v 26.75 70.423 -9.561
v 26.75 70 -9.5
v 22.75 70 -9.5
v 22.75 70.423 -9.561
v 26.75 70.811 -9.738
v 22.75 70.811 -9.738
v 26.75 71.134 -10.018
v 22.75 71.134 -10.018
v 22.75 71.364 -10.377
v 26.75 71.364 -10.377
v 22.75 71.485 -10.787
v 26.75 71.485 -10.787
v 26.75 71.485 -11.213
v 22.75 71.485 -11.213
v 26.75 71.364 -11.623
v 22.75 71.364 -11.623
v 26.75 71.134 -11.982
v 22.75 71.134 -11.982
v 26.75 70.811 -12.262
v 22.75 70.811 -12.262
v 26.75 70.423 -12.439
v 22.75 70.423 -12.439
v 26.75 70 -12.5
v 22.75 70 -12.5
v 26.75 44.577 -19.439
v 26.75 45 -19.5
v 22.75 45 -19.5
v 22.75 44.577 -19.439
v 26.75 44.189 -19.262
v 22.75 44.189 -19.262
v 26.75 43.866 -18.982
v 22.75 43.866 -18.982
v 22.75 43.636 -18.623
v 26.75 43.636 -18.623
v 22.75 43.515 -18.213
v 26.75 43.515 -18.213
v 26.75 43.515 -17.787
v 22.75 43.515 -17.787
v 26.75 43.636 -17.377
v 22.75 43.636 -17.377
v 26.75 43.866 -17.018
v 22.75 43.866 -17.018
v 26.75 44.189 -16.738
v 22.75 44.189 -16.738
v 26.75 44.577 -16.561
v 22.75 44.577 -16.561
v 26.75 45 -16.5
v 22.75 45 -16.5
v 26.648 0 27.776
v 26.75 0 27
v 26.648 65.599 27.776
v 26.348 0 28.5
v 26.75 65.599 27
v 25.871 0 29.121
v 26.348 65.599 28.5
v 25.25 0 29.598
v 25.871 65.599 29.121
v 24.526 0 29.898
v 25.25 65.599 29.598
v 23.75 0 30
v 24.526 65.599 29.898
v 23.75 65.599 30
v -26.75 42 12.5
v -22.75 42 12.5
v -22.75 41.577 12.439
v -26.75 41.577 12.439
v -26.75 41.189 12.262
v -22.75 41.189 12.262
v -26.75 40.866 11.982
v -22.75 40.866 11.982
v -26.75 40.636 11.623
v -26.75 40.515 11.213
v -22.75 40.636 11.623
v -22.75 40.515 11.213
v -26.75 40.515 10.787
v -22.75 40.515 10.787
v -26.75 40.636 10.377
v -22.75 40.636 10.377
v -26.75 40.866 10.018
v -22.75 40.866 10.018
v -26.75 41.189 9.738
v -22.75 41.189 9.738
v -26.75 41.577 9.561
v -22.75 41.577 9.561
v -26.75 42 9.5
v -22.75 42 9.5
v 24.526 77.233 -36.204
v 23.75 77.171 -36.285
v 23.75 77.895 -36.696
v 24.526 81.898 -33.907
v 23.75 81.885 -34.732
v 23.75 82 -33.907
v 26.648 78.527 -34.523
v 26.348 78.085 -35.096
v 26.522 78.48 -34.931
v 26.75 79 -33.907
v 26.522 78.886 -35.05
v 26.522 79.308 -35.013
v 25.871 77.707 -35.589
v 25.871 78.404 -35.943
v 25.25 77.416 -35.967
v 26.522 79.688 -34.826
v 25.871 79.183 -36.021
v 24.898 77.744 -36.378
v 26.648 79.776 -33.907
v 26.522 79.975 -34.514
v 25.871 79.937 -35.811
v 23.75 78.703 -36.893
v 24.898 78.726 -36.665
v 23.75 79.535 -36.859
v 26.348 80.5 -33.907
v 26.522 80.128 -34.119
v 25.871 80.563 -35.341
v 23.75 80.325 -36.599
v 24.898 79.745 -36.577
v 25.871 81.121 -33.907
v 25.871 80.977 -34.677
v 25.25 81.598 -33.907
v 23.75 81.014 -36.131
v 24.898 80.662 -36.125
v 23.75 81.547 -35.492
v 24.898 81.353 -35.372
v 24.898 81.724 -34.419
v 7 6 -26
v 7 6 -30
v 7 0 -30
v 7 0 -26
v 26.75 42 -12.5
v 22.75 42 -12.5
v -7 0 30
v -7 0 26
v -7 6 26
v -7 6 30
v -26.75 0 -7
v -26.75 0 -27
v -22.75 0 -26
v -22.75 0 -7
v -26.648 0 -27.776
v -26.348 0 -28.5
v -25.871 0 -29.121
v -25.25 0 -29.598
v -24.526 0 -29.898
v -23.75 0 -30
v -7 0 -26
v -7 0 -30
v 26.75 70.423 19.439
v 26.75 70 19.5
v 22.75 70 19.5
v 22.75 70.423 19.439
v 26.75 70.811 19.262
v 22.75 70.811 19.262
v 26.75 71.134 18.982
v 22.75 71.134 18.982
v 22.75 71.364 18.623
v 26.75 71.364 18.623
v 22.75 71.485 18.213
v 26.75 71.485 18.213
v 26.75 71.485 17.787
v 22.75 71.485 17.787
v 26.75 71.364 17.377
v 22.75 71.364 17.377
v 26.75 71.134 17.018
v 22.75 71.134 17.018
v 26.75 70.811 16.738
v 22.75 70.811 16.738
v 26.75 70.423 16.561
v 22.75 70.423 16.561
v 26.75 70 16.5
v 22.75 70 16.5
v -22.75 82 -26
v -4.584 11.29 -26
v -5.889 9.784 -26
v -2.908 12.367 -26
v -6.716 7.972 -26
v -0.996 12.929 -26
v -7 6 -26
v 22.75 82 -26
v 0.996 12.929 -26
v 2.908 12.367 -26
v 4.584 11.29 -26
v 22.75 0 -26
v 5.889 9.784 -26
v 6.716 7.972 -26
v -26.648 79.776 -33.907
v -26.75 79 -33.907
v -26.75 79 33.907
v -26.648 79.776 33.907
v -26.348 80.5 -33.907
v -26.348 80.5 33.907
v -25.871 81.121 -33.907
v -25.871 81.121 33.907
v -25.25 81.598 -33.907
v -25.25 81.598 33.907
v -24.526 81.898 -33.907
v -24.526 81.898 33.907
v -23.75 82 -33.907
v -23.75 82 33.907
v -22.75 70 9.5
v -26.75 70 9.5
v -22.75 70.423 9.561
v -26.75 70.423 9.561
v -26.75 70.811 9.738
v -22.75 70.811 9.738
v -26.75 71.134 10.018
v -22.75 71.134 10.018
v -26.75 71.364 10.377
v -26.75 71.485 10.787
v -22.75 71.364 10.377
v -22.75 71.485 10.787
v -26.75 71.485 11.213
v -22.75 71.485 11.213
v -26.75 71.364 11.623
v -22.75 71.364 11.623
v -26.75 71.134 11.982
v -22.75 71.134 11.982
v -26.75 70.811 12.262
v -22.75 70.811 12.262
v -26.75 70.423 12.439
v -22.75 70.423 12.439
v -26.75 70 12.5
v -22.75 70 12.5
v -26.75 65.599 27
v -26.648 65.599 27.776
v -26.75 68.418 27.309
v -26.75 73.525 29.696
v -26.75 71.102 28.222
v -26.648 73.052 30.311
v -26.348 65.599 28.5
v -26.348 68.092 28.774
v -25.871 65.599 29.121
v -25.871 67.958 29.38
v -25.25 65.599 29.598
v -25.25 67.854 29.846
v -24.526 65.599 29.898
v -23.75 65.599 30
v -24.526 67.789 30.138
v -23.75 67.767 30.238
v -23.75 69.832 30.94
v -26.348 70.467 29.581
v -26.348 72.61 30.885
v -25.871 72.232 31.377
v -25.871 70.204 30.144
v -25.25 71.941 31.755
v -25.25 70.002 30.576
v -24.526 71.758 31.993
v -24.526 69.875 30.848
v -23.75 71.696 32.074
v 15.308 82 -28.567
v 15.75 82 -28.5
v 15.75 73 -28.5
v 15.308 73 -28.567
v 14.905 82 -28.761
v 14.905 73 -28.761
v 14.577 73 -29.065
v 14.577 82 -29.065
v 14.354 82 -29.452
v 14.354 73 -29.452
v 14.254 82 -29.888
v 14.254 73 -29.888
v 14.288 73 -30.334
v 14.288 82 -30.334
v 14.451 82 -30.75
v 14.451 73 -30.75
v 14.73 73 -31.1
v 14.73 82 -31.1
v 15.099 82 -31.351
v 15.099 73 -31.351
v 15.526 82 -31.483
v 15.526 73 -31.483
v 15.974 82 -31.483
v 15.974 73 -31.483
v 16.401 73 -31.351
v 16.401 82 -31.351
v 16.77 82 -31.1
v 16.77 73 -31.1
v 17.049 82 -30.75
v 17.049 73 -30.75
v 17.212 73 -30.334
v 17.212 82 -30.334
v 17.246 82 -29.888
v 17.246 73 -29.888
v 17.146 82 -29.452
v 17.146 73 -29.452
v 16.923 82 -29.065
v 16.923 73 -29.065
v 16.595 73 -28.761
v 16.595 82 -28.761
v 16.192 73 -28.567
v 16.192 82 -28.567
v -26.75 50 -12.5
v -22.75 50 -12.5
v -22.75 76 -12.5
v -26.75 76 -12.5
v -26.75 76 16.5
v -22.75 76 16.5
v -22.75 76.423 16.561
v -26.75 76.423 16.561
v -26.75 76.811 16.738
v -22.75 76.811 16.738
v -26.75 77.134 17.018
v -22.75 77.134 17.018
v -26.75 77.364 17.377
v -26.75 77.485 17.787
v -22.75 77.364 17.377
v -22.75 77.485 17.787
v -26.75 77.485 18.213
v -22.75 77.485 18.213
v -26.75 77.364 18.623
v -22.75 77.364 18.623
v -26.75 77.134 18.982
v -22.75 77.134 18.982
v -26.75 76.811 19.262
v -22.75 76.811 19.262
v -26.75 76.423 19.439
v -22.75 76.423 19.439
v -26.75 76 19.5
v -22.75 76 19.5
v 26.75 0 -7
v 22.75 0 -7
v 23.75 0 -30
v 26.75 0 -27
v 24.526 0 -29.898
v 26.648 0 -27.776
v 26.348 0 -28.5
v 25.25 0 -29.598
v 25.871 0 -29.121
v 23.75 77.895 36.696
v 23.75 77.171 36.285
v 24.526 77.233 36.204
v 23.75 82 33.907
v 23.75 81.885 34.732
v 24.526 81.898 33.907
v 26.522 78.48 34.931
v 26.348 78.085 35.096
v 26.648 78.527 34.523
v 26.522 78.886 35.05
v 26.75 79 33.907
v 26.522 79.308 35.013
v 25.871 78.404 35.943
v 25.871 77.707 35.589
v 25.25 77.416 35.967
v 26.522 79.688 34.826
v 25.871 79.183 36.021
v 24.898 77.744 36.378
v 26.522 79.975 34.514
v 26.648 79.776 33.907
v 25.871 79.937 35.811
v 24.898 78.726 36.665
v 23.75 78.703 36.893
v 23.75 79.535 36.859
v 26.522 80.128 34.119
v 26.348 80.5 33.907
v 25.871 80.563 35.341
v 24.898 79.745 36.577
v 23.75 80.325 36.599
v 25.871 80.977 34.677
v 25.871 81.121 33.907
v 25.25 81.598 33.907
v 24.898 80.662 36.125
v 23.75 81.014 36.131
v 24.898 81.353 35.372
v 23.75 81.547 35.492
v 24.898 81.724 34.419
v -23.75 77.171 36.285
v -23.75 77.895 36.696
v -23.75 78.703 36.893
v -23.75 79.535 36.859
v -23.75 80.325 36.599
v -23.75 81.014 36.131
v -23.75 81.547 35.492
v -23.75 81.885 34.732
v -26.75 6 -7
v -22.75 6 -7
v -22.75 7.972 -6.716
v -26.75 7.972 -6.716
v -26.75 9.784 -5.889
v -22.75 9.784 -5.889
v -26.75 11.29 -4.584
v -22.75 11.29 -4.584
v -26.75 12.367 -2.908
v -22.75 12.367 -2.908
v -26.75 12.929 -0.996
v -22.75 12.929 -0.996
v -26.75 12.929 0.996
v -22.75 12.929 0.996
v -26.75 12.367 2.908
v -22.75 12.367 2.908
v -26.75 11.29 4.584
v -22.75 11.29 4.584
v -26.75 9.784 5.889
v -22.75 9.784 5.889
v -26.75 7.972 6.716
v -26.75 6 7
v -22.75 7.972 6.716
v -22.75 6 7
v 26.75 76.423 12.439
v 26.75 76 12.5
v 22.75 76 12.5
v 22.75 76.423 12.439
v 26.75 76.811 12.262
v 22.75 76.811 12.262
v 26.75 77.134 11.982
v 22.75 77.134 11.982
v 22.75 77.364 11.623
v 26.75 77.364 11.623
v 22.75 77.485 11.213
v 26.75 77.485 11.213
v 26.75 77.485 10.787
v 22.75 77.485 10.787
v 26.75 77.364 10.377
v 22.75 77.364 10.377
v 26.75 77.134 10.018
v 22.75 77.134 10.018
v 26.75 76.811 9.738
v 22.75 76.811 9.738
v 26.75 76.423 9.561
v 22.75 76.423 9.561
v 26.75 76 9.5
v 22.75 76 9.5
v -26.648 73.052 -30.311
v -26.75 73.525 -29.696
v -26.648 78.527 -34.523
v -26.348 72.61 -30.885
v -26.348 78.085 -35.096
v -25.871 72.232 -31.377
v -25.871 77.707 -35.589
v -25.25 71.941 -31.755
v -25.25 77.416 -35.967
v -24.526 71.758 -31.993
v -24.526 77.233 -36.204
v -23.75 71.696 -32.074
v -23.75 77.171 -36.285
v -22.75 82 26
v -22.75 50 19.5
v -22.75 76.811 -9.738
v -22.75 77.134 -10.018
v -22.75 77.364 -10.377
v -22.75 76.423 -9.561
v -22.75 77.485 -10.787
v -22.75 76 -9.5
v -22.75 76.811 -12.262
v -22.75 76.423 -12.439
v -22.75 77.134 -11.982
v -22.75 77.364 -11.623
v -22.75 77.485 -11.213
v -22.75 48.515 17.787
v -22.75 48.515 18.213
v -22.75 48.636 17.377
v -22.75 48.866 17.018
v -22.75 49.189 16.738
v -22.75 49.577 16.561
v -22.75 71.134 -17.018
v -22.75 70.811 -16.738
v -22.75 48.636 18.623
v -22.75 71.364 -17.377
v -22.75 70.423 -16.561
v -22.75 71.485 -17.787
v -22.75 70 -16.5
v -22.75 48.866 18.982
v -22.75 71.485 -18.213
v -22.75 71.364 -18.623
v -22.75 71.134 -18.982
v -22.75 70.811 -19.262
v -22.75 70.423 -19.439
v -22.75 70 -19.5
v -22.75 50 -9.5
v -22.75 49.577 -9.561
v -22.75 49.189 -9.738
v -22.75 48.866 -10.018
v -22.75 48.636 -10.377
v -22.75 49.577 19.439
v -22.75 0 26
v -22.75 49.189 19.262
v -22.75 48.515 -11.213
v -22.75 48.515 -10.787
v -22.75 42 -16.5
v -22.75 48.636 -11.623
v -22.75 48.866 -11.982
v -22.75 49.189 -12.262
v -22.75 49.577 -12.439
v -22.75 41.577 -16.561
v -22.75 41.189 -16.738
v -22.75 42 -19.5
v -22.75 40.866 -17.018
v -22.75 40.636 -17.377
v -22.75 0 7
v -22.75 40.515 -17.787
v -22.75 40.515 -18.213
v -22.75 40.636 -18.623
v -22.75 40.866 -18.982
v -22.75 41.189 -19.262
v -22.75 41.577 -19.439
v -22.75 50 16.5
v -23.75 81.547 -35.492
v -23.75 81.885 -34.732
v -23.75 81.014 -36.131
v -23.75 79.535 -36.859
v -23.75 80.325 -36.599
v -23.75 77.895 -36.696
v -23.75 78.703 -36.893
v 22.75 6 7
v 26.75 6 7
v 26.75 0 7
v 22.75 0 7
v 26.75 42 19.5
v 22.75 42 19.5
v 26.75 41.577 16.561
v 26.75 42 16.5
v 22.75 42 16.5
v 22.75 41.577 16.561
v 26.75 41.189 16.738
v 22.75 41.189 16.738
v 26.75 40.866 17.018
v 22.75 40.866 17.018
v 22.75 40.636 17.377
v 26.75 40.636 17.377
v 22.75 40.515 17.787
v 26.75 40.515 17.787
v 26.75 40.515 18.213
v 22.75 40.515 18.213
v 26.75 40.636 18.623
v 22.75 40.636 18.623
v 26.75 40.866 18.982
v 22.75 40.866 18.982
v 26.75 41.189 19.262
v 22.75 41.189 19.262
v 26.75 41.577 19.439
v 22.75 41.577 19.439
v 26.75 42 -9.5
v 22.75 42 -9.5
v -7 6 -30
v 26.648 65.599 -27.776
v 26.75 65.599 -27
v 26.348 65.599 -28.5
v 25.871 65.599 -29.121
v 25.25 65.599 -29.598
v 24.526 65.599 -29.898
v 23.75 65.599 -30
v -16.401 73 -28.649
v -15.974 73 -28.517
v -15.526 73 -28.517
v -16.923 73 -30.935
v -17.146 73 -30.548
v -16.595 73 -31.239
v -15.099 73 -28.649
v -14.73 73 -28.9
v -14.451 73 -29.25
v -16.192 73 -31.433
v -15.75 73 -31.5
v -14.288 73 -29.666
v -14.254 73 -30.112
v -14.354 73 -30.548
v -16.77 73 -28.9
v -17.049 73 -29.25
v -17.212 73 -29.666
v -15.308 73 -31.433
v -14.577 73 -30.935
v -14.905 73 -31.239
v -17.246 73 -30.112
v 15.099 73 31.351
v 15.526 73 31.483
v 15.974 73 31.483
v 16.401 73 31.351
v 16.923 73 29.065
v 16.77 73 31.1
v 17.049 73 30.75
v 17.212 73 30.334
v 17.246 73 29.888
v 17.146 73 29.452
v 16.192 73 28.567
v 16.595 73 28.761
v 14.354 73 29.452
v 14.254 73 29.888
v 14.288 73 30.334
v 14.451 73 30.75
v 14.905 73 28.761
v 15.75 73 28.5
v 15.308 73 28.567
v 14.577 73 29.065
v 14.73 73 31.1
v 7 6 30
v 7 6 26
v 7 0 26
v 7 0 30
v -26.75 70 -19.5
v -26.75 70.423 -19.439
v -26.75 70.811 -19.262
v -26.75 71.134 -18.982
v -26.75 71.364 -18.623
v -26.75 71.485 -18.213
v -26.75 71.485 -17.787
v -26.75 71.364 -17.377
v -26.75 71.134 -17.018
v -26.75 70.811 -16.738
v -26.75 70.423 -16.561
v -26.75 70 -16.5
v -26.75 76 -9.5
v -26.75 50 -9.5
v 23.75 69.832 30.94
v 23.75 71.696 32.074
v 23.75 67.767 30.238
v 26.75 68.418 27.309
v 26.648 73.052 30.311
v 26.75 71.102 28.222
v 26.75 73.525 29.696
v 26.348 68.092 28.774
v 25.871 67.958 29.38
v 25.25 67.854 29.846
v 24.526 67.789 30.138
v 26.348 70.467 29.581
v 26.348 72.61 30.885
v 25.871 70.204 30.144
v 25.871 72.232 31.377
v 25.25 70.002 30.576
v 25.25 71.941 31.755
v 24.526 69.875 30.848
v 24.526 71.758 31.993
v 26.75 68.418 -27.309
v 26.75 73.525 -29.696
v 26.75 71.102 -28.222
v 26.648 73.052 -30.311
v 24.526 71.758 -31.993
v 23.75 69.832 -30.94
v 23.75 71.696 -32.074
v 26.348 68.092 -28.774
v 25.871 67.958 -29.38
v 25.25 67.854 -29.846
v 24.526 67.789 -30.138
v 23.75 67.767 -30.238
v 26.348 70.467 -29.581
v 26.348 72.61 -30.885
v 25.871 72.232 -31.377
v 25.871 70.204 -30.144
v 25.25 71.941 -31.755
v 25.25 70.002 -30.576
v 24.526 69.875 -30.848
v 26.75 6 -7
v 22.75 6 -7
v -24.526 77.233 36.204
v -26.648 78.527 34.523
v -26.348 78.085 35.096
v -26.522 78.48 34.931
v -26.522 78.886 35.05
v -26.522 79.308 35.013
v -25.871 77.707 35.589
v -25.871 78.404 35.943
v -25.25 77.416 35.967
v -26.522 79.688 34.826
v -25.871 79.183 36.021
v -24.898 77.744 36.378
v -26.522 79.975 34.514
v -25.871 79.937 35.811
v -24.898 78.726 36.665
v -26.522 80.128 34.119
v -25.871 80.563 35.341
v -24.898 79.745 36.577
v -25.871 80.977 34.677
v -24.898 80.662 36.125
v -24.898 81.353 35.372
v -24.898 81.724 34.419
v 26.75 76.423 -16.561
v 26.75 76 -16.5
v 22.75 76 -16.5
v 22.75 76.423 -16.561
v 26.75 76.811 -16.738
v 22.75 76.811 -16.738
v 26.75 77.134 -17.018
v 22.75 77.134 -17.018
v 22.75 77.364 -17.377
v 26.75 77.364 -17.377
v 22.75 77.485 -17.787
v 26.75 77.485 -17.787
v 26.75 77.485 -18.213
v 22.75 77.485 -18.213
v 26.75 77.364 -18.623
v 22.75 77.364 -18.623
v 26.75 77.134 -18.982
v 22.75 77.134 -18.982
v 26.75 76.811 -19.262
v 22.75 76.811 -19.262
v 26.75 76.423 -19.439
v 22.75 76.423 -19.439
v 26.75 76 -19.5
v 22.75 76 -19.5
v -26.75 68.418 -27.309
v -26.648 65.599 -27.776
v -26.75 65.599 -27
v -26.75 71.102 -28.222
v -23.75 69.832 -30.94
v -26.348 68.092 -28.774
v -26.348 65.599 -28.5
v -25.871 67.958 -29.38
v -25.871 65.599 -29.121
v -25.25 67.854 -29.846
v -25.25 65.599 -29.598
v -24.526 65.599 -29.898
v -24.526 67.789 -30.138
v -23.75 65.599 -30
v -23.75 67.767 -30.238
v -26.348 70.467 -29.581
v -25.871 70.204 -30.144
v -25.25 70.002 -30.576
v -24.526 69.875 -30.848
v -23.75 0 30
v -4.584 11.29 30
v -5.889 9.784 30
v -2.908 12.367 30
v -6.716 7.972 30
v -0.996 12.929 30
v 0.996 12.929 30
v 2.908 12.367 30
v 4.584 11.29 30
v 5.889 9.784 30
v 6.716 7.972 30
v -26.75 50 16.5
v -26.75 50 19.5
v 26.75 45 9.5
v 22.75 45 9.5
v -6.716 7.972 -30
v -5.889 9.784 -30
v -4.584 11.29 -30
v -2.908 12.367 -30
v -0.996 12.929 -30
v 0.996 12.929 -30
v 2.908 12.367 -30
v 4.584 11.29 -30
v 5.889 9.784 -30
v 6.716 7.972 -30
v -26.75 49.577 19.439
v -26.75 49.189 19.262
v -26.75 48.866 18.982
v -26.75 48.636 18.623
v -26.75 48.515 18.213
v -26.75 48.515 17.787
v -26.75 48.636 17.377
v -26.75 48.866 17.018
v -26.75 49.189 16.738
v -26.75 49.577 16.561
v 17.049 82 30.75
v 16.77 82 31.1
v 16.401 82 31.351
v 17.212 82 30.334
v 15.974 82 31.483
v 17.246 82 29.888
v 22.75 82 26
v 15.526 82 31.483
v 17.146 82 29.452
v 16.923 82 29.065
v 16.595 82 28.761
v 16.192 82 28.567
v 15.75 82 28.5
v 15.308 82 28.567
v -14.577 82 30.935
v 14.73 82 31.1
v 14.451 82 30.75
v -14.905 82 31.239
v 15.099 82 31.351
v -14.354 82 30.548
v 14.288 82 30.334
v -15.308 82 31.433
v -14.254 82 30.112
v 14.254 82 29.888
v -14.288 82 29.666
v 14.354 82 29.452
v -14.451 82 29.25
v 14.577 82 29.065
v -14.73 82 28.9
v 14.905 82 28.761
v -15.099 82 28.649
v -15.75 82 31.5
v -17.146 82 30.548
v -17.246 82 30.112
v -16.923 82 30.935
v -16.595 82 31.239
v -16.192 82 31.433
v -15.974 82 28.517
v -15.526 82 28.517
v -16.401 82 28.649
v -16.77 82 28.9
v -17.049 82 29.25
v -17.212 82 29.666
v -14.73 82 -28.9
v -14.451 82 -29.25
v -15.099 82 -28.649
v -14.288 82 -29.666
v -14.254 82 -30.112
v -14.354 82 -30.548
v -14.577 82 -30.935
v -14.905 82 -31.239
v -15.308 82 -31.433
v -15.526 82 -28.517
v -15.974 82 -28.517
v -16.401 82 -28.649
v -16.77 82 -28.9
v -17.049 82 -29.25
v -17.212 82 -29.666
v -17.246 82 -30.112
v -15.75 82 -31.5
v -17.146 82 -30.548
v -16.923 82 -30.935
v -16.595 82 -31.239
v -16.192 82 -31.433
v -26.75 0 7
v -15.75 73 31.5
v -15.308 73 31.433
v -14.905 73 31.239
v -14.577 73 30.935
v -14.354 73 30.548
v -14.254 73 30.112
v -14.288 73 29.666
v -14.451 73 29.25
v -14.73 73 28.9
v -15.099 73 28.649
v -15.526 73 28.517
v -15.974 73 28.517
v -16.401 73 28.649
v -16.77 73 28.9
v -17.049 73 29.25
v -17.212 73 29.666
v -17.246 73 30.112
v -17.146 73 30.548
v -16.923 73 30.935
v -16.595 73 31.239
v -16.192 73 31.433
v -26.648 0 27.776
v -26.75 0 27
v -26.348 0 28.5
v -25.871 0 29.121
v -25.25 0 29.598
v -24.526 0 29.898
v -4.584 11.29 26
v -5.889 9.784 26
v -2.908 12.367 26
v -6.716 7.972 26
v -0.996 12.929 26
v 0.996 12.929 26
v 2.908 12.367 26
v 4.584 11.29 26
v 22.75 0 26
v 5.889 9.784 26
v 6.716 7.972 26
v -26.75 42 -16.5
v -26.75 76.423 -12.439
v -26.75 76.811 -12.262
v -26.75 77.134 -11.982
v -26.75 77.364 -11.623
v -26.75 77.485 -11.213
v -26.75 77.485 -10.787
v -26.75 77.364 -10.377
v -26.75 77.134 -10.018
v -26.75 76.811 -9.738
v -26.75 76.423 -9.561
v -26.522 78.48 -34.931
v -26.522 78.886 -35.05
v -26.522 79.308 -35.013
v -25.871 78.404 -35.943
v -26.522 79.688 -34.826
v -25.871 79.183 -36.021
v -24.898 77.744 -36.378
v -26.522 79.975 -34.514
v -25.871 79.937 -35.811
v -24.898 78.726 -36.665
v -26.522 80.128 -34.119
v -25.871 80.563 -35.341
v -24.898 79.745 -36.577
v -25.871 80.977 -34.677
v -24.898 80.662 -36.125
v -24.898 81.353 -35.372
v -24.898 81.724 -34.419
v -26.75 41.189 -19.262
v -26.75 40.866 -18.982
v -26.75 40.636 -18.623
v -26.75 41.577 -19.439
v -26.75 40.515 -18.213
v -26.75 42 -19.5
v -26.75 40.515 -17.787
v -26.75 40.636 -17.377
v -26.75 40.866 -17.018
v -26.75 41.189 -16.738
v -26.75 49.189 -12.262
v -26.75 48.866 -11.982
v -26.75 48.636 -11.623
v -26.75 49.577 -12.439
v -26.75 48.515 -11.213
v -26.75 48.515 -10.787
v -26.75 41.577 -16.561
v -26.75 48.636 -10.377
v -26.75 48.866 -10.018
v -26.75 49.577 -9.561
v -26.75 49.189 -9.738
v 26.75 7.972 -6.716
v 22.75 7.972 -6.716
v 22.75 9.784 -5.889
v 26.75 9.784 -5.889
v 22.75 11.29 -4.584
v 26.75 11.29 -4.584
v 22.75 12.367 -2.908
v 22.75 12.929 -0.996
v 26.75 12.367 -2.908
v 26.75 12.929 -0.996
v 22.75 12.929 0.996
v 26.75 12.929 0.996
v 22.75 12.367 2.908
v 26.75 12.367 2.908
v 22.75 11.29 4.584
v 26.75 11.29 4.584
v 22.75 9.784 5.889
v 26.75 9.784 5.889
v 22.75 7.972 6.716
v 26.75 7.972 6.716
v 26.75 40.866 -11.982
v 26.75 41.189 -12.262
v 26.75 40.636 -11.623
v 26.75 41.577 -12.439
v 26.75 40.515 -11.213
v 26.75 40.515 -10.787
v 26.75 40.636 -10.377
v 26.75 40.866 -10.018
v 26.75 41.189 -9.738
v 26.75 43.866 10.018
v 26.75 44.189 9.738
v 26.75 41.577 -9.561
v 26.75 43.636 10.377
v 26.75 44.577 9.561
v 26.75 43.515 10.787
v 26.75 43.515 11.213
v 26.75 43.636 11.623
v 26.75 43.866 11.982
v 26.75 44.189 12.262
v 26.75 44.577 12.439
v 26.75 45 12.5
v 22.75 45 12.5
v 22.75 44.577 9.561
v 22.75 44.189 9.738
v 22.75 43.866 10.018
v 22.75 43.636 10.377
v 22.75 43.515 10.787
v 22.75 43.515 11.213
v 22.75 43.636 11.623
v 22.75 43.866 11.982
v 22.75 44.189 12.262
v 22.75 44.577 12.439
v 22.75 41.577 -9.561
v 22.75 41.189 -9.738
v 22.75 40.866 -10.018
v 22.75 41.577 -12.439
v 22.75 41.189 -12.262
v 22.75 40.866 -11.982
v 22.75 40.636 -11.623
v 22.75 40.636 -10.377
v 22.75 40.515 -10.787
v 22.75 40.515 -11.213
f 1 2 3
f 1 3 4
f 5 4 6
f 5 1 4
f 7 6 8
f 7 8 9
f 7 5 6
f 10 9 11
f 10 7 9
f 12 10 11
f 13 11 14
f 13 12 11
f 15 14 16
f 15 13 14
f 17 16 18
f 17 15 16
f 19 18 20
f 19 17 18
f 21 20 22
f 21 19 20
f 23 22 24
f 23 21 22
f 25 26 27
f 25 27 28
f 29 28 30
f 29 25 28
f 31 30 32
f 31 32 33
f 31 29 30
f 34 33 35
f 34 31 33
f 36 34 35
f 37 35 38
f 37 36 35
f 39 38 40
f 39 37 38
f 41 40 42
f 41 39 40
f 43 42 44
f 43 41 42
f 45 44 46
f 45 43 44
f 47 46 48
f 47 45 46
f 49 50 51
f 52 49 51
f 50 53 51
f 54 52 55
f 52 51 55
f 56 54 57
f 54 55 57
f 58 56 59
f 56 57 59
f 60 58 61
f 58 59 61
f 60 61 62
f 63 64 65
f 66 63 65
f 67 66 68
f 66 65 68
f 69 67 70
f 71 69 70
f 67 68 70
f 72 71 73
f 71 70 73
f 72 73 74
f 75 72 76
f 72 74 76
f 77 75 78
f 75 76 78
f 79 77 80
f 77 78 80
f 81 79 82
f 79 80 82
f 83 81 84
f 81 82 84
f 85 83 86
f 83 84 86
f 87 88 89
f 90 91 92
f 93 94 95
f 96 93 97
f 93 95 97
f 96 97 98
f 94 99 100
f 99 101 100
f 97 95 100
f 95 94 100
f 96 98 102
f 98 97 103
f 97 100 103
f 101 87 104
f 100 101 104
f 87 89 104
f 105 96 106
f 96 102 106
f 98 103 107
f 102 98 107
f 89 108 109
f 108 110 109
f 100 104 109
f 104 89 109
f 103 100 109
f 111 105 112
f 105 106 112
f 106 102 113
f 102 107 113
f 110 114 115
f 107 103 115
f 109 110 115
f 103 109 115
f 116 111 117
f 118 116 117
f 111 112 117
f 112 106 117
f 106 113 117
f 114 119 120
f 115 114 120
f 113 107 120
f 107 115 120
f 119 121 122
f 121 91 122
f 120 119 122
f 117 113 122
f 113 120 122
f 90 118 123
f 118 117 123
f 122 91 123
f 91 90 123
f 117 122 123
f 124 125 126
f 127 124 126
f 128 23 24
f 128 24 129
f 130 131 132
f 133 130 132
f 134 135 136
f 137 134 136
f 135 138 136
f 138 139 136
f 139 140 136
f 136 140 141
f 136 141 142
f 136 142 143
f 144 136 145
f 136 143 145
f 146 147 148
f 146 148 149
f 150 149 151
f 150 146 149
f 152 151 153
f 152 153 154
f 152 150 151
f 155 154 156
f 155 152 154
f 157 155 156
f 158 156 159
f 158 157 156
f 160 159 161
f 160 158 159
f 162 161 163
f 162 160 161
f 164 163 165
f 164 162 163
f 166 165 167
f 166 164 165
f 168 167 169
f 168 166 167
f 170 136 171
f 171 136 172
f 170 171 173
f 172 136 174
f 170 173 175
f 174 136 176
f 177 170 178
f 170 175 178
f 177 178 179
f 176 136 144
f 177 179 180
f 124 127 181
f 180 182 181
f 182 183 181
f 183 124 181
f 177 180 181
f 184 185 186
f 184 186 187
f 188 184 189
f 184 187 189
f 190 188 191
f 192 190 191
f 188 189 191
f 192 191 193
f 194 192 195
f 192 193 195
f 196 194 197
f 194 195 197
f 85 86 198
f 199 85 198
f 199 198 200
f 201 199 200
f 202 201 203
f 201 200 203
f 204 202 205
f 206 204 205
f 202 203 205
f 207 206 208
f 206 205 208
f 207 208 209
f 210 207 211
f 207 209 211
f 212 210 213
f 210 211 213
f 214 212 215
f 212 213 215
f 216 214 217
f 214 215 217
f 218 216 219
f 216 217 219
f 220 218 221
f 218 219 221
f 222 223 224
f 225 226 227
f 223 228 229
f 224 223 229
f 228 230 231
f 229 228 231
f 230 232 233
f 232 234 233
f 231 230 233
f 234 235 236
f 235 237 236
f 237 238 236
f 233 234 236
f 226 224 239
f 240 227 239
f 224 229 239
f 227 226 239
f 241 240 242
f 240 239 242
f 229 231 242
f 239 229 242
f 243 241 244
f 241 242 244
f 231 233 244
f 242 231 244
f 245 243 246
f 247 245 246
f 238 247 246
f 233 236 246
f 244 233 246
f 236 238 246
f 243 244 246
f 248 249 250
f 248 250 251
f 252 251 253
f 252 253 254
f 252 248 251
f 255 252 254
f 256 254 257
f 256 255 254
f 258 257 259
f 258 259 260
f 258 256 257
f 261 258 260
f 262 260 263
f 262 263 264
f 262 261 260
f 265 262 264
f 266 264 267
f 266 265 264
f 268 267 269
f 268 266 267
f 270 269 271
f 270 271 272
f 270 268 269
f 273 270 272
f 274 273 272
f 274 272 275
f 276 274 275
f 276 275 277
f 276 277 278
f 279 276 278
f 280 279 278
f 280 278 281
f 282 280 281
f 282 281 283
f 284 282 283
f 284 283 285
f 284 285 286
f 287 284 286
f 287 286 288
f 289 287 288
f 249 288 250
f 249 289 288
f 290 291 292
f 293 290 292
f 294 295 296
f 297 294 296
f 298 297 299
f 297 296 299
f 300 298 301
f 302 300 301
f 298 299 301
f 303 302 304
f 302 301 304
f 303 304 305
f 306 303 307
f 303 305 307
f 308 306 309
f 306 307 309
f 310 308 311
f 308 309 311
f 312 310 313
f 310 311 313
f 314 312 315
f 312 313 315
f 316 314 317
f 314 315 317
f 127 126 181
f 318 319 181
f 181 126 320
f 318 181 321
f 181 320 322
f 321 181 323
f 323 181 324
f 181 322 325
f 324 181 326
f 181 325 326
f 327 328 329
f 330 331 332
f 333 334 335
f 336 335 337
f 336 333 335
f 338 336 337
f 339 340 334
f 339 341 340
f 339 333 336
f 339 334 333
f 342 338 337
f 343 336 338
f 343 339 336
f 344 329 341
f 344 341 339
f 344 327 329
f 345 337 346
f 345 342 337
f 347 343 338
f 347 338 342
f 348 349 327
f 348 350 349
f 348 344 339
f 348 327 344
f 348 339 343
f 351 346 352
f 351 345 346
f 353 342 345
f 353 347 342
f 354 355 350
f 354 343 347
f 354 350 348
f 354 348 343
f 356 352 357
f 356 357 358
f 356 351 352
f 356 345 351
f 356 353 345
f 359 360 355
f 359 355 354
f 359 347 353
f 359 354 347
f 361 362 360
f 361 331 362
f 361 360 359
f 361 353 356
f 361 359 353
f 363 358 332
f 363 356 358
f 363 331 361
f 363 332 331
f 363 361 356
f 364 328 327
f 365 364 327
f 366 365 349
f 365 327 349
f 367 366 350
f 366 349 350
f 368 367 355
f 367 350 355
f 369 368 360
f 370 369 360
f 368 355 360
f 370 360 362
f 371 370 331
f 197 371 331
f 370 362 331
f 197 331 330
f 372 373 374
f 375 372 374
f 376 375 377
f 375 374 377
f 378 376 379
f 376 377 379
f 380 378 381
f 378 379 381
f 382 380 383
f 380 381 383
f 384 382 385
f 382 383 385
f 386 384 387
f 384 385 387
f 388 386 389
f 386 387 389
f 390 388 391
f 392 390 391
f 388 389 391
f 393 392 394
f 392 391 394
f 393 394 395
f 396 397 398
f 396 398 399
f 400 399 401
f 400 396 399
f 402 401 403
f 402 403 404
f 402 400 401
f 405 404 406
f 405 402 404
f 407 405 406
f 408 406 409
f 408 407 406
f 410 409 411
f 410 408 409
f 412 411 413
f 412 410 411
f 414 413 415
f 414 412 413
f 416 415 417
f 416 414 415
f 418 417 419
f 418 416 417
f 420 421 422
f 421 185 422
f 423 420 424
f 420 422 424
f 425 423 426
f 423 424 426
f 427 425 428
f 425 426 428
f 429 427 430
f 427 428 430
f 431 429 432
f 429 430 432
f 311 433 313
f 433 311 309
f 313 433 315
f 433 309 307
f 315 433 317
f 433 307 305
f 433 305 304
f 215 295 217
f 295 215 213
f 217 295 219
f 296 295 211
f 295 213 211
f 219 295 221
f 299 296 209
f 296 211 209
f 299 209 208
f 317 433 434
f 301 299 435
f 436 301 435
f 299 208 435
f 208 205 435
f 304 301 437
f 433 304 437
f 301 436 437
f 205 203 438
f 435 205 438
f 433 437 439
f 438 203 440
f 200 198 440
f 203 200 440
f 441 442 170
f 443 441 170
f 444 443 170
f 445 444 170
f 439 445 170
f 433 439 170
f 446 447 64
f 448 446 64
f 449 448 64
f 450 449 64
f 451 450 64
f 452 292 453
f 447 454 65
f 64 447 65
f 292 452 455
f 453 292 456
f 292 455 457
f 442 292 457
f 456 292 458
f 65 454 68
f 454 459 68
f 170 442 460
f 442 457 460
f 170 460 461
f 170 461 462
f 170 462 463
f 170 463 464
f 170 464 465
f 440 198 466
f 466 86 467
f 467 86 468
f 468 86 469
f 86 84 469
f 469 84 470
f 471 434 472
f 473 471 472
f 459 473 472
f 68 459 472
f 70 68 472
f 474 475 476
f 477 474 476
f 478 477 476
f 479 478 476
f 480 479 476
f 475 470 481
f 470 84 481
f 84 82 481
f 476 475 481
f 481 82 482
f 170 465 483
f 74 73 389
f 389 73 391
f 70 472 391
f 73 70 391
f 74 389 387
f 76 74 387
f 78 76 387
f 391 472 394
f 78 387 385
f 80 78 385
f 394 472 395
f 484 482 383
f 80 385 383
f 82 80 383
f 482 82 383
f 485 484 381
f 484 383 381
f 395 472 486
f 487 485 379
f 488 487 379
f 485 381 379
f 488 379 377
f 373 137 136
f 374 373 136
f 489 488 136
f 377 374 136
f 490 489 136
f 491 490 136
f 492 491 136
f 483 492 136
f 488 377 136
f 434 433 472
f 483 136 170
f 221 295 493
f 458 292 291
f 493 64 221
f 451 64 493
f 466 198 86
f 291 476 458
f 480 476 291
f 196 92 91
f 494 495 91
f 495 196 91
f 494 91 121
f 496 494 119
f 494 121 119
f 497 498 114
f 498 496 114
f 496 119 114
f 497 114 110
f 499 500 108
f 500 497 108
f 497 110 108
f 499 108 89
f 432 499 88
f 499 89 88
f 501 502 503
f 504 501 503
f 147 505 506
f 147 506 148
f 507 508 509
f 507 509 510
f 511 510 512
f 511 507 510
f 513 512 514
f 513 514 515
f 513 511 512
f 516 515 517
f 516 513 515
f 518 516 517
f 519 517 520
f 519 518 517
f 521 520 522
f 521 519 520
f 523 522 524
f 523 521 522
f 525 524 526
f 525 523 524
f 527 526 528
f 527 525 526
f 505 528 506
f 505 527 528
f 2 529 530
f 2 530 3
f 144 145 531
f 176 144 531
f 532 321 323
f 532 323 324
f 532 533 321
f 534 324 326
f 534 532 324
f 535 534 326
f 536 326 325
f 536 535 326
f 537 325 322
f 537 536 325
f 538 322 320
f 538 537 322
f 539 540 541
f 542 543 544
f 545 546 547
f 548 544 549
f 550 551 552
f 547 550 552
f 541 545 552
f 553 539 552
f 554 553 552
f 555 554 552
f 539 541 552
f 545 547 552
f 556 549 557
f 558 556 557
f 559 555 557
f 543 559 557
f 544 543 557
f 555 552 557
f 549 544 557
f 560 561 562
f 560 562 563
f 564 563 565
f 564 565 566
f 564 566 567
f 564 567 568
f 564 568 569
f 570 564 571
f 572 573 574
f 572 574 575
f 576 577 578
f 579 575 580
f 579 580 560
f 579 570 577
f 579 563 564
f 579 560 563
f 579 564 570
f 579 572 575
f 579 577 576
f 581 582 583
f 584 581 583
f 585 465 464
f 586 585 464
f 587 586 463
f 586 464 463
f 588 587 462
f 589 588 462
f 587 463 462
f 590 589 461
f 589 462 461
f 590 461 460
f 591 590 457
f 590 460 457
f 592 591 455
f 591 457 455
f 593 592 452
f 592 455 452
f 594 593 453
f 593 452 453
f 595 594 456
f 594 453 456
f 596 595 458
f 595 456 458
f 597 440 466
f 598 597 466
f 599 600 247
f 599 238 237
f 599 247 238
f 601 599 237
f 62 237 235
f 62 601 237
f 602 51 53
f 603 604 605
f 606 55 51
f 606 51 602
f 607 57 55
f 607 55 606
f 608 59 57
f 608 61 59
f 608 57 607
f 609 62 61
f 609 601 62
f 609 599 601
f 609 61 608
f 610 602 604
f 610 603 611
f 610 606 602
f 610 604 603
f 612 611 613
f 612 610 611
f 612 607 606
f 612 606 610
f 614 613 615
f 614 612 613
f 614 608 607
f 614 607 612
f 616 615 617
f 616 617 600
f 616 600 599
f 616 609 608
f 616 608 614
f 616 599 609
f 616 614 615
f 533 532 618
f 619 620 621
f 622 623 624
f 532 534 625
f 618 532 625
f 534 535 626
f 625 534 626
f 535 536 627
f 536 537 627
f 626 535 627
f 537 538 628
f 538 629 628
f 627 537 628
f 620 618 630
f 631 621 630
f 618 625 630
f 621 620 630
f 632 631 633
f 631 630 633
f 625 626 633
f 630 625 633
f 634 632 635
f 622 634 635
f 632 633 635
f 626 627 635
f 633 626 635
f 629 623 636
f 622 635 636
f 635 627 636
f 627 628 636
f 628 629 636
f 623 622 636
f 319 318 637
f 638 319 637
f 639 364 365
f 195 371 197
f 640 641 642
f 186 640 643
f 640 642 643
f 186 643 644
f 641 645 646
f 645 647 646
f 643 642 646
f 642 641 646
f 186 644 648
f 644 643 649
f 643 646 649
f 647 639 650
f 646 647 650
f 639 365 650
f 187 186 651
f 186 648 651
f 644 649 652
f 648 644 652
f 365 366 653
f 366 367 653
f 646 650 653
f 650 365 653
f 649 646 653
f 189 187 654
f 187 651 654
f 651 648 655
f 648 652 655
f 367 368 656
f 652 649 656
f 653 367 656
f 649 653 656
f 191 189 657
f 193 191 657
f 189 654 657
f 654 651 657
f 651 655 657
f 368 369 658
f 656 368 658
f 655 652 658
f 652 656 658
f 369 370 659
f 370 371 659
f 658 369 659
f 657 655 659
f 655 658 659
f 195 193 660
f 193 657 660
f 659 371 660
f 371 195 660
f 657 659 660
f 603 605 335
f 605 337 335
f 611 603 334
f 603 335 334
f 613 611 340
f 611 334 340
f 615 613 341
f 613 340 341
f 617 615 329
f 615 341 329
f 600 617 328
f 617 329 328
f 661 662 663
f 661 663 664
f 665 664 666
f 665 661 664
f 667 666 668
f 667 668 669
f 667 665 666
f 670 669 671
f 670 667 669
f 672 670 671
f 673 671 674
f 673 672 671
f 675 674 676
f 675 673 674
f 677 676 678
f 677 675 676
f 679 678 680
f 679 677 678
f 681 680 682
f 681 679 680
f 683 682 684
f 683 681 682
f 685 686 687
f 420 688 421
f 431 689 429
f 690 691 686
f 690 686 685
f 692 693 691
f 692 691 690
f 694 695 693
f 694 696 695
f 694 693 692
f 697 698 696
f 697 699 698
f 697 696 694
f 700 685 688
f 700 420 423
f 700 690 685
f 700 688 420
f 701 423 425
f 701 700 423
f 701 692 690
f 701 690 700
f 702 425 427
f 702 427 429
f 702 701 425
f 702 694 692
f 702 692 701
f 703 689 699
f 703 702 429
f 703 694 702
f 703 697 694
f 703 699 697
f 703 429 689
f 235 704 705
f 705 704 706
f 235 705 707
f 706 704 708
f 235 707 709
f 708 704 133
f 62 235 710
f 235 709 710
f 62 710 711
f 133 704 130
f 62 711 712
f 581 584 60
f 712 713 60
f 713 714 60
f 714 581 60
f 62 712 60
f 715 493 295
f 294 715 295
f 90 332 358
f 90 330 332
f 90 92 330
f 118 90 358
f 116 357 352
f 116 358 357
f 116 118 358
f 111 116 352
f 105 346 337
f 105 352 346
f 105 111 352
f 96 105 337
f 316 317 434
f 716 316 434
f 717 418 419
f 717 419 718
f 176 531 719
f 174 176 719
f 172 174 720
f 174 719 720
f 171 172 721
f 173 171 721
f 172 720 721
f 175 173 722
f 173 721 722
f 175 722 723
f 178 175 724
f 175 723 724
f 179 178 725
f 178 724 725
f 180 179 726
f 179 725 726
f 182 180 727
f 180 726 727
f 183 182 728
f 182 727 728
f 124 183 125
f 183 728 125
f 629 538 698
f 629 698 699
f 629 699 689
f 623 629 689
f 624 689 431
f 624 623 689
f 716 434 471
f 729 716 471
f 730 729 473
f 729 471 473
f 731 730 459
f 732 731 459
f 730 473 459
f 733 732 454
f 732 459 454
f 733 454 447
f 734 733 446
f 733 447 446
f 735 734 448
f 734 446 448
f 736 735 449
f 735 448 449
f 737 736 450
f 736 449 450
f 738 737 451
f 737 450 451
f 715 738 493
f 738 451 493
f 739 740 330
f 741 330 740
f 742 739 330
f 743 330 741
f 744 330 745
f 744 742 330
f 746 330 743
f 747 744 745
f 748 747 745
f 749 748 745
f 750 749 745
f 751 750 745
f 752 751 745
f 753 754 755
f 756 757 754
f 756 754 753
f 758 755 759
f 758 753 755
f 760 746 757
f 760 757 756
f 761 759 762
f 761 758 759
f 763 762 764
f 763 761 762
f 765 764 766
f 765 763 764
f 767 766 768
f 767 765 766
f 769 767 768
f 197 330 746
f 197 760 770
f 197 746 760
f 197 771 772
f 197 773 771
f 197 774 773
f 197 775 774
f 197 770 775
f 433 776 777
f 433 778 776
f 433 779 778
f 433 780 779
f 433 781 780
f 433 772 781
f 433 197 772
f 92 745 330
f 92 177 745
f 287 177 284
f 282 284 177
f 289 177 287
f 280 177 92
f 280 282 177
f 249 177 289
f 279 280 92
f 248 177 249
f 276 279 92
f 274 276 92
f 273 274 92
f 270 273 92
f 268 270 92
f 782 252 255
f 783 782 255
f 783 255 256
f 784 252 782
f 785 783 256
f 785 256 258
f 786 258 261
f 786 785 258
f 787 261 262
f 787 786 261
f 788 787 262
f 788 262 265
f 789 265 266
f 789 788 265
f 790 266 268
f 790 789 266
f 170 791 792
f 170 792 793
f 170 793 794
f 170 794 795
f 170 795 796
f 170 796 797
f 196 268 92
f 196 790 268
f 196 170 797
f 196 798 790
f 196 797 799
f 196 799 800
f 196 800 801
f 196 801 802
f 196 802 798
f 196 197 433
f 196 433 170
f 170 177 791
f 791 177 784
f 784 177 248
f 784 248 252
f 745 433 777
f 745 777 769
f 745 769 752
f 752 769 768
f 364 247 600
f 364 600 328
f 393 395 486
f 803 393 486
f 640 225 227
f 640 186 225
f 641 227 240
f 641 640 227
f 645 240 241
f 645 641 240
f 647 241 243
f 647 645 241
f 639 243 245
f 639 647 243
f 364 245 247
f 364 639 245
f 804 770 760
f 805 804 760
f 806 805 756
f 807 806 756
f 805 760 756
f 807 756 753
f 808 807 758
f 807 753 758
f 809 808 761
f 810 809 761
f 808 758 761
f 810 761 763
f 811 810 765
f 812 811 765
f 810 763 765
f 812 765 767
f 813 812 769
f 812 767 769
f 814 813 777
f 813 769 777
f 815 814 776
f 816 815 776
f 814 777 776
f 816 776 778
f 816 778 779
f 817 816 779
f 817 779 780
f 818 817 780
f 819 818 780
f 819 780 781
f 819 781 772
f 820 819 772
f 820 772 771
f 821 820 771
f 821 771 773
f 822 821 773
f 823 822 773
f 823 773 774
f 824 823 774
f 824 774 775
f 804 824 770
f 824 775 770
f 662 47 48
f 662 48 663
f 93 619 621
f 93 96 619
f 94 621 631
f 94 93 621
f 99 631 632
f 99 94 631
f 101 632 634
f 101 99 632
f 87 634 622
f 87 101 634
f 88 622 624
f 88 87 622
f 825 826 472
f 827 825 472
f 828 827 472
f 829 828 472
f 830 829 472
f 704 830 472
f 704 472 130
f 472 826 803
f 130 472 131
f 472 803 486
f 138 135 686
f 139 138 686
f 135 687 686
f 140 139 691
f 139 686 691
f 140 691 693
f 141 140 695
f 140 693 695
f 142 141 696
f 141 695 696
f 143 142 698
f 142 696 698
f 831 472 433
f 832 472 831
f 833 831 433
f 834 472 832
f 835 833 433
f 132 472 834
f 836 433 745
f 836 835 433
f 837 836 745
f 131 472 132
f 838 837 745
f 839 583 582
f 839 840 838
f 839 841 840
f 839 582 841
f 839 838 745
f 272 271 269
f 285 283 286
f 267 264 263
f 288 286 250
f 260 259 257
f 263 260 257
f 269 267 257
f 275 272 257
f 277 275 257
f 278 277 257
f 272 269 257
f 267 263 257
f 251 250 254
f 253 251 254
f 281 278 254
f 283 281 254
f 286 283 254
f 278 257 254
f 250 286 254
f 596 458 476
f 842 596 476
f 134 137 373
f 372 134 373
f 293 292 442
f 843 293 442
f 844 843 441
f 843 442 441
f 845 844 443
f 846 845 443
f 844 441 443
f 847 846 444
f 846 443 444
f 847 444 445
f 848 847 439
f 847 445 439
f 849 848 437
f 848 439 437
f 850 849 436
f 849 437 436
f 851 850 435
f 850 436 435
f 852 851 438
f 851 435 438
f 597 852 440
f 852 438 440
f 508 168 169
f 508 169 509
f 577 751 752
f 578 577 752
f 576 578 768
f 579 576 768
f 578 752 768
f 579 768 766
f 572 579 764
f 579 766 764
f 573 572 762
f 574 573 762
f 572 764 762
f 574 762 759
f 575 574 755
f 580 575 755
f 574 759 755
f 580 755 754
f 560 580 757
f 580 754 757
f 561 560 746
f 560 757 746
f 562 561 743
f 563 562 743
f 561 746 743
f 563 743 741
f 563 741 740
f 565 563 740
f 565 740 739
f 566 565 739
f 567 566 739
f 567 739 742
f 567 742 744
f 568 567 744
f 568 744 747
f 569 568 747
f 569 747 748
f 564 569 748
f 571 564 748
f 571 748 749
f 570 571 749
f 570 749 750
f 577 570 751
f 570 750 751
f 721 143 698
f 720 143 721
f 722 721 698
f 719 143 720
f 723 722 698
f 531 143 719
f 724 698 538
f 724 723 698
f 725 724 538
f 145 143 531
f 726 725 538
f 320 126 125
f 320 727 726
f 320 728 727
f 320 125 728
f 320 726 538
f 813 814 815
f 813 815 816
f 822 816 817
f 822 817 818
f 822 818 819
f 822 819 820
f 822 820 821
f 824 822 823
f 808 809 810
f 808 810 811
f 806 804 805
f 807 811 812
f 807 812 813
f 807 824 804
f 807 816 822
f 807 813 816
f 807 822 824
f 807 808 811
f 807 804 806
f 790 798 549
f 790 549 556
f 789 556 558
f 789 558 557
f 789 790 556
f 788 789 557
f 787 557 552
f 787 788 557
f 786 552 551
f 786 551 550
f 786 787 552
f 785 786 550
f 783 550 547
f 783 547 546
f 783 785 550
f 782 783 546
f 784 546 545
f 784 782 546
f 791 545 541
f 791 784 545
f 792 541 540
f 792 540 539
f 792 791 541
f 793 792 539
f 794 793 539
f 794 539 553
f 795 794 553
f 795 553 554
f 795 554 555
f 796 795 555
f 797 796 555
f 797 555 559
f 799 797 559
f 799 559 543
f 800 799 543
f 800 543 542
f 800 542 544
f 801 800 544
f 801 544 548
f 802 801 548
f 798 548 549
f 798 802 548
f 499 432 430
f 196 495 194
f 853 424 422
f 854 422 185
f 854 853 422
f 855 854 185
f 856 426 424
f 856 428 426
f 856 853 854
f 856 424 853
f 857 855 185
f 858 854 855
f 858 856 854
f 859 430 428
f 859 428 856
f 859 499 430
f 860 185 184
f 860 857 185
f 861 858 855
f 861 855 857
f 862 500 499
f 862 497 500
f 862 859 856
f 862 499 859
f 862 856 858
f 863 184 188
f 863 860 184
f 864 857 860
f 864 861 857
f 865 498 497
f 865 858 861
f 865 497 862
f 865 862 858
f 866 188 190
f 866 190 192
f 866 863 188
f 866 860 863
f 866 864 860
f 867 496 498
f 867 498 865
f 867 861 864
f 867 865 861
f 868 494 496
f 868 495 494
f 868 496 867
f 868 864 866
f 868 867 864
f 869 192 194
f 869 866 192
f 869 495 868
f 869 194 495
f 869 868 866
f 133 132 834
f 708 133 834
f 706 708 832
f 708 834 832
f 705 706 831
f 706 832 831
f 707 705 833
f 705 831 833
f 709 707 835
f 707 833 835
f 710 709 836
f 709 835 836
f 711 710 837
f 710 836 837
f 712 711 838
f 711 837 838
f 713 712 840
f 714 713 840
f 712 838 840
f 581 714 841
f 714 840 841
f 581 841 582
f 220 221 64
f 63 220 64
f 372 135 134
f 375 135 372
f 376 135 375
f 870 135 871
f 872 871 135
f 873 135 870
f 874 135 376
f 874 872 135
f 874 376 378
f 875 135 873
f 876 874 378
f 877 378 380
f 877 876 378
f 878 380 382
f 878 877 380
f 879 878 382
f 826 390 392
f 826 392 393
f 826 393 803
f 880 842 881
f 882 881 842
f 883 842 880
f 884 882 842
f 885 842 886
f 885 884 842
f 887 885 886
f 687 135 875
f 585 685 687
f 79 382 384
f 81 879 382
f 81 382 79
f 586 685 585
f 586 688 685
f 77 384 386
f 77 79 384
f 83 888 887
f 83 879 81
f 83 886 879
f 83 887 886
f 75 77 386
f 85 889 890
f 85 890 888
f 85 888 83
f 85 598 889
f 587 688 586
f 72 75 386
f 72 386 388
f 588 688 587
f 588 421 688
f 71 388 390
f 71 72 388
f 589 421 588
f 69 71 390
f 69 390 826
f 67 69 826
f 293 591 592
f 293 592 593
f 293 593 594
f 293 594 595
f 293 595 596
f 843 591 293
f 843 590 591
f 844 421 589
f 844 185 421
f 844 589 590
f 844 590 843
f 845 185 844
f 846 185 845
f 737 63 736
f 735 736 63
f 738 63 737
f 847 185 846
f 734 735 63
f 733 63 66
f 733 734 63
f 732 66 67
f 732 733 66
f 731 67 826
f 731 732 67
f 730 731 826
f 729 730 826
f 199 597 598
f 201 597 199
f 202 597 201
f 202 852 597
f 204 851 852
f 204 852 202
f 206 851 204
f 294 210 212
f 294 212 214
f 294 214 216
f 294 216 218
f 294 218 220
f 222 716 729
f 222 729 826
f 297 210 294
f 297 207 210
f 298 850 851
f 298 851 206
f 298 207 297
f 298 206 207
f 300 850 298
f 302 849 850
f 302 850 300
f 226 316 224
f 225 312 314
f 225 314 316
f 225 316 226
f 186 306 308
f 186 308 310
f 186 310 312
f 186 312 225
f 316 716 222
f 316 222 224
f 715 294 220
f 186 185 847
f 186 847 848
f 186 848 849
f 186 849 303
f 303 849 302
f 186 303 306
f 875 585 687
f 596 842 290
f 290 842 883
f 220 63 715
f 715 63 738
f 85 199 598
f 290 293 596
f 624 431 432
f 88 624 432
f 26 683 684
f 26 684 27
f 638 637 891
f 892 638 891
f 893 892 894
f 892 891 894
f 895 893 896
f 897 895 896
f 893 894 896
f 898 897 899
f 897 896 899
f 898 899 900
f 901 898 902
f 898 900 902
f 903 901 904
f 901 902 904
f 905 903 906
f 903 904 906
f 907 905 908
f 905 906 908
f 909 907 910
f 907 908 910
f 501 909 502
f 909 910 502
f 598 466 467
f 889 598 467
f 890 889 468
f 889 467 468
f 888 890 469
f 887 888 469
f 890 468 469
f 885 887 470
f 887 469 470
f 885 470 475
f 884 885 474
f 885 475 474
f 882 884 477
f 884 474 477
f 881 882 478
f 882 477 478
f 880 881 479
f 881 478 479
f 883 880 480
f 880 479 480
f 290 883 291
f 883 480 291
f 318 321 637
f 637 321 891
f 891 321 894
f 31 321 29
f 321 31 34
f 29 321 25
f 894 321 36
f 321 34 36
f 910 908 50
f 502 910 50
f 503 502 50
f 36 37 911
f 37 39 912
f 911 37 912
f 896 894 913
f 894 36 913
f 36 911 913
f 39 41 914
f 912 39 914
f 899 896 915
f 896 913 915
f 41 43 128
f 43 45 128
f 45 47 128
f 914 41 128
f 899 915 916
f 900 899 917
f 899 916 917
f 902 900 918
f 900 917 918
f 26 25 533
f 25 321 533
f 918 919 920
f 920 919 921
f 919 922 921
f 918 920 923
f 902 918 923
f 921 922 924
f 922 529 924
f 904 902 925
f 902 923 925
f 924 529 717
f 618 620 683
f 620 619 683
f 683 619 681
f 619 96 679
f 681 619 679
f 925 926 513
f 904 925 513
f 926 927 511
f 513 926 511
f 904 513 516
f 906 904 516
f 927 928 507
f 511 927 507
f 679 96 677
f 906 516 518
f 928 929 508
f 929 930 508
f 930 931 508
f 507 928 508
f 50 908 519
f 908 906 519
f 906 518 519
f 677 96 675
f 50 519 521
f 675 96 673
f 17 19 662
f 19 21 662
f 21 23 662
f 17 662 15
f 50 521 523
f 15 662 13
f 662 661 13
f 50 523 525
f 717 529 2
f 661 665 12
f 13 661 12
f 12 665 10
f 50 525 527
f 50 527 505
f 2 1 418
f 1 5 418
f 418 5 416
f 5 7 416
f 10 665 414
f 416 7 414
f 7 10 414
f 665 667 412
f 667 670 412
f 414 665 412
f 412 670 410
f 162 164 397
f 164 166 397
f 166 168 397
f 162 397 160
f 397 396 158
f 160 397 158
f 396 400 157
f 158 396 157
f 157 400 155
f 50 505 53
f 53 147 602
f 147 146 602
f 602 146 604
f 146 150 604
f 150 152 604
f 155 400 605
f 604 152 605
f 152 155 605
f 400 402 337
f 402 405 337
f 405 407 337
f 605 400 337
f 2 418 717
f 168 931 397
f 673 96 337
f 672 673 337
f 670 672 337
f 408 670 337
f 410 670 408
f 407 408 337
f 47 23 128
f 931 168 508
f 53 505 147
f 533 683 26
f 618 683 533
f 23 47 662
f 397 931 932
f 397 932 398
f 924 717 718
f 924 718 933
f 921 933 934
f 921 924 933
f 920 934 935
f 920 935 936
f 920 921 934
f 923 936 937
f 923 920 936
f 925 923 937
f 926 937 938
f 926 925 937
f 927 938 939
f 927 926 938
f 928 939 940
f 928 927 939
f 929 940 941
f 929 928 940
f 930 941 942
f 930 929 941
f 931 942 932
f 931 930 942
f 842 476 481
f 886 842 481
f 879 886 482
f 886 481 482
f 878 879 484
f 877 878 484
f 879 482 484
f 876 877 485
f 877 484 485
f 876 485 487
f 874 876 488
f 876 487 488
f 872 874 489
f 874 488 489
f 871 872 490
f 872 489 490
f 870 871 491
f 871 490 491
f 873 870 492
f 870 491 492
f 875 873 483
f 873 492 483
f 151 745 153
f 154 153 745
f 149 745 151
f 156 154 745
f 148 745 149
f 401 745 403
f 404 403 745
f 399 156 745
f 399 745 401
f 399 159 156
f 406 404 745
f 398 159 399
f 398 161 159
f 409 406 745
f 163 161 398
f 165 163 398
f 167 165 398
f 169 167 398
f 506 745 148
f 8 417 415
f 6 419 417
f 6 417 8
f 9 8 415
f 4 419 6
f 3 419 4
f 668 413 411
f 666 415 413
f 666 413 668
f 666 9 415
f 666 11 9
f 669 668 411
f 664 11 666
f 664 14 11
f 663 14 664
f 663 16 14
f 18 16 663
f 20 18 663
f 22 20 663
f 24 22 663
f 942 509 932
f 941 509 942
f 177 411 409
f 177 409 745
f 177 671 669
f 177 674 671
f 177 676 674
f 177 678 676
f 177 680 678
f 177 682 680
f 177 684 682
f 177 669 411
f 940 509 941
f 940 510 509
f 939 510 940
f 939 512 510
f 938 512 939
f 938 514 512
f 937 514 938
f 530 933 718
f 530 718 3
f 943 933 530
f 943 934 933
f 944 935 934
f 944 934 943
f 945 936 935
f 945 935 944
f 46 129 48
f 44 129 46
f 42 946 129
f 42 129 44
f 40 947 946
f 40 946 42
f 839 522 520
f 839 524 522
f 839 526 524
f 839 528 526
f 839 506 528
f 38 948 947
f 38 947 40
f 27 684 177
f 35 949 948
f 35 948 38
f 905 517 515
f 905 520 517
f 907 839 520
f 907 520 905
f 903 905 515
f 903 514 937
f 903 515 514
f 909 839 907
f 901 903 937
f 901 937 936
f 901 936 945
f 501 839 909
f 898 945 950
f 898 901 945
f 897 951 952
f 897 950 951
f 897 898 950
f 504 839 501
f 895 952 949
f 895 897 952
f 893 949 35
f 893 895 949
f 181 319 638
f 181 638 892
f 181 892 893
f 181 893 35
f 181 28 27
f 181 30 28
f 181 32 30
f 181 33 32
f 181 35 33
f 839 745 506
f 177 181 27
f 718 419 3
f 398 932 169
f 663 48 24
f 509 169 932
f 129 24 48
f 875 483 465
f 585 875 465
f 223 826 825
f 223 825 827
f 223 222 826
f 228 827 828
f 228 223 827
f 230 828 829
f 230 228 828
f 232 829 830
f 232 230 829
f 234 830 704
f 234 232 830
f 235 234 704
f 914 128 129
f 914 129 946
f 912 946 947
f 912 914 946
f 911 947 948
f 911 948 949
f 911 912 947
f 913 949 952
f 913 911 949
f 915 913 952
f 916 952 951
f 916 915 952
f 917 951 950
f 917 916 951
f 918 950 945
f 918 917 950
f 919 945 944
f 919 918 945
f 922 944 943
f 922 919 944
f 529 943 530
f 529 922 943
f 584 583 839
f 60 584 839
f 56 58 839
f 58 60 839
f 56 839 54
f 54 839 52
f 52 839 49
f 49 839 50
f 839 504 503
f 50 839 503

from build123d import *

# Parameters (mm, degrees)
SKETCH1_W           = 53.5
SKETCH1_H           = 60
SKETCH1_W_2         = 45.5
SKETCH1_H_2         = 52
BOSS_EXTRUDE1_DEPTH = 82
CUT_EXTRUDE1_START  = -4
CUT_EXTRUDE1_DEPTH  = 107.40239255
LPATTERN1_COUNT     = 2
LPATTERN1_PITCH     = 29
CUT_EXTRUDE2_DEPTH  = 4
LPATTERN2_COUNT     = 2
LPATTERN2_PITCH     = 29
BOSS_EXTRUDE2_DEPTH = 53.5
FILLET1_R           = 10
FILLET2_R           = 3
SKETCH6_R           = 1.5
CUT_EXTRUDE3_DEPTH  = 9
CUT_EXTRUDE4_DEPTH  = 105.634635656
CUT_EXTRUDE5_DEPTH  = 110.161184183


with BuildPart() as part:
    # Sketch1 → Boss-Extrude1 (new body)
    with BuildSketch(Plane(origin=(0, 0, 0), x_dir=(1, 0, 0), z_dir=(0, 1, 0))):
        Rectangle(SKETCH1_W, SKETCH1_H)
        Rectangle(SKETCH1_W_2, SKETCH1_H_2, mode=Mode.SUBTRACT)
    extrude(amount=BOSS_EXTRUDE1_DEPTH)

    # Sketch3 → Cut-Extrude1 (cut)
    with BuildSketch(Plane.ZY.offset(26.75).offset(CUT_EXTRUDE1_START)):
        with BuildLine():
            Line((19.5, 76), (19.5, 50))
            ThreePointArc((19.5, 50), (18, 48.5), (16.5, 50))
            Line((16.5, 50), (16.5, 76))
            ThreePointArc((16.5, 76), (18, 77.5), (19.5, 76))
        make_face()
        with BuildLine():
            Line((12.5, 70), (12.5, 42))
            ThreePointArc((12.5, 42), (11, 40.5), (9.5, 42))
            Line((9.5, 42), (9.5, 70))
            ThreePointArc((9.5, 70), (11, 71.5), (12.5, 70))
        make_face()
    cut_extrude1 = extrude(amount=CUT_EXTRUDE1_DEPTH, mode=Mode.SUBTRACT)

    # LPattern1: Cut-Extrude1 ×2
    with Locations(*[(0, 0, -i * LPATTERN1_PITCH) for i in range(1, LPATTERN1_COUNT)]):
        add(cut_extrude1, mode=Mode.SUBTRACT)

    # Sketch4 → Cut-Extrude2 (cut)
    with BuildSketch(Plane(origin=(26.75, 0, 0), x_dir=(0, 0, -1), z_dir=(1, 0, 0))):
        with BuildLine():
            Line((-9.5, 76), (-9.5, 45))
            ThreePointArc((-9.5, 45), (-11, 43.5), (-12.5, 45))
            Line((-12.5, 45), (-12.5, 76))
            ThreePointArc((-12.5, 76), (-11, 77.5), (-9.5, 76))
        make_face()
        with BuildLine():
            Line((-16.5, 70), (-16.5, 42))
            ThreePointArc((-16.5, 42), (-18, 40.5), (-19.5, 42))
            Line((-19.5, 42), (-19.5, 70))
            ThreePointArc((-19.5, 70), (-18, 71.5), (-16.5, 70))
        make_face()
    cut_extrude2 = extrude(amount=-CUT_EXTRUDE2_DEPTH, mode=Mode.SUBTRACT)

    # LPattern2: Cut-Extrude2 ×2
    with Locations(*[(0, 0, -i * LPATTERN2_PITCH) for i in range(1, LPATTERN2_COUNT)]):
        add(cut_extrude2, mode=Mode.SUBTRACT)

    # Sketch5 → Boss-Extrude2 (add, through all)
    with BuildSketch(Plane.ZY.offset(26.75)):
        Polygon((30, 82), (30, 69), (40, 82), align=None)
        Polygon((-30, 82), (-30, 69), (-40, 82), align=None)
    extrude(amount=-BOSS_EXTRUDE2_DEPTH)

    # Fillet1
    fillet1_edges = [part.edges().sort_by_distance(p)[0] for p in [
        (0, 69, 30),
        (0, 69, -30),
    ]]
    fillet(fillet1_edges, radius=FILLET1_R)

    # Fillet2
    fillet2_edges = [part.edges().sort_by_distance(p)[0] for p in [
        (-26.75, 82, 0),
        (0, 82, 40),
        (0, 82, -40),
        (26.75, 76.847944071, -36.036880054),
        (-26.75, 76.847944071, -36.036880054),
        (26.75, 32.799390267, 30),
        (-26.75, 32.799390267, 30),
        (-26.75, 76.847944071, 36.036880054),
        (26.75, 76.847944071, 36.036880054),
        (26.75, 32.799390267, -30),
        (-26.75, 32.799390267, -30),
        (-26.75, 68.818842729, 30.532624468),
        (26.75, 68.818842729, 30.532624468),
        (-26.75, 68.818842729, -30.532624468),
        (26.75, 68.818842729, -30.532624468),
        (26.75, 82, 0),
    ]]
    fillet(fillet2_edges, radius=FILLET2_R)

    # Sketch6 → Cut-Extrude3 (cut)
    with BuildSketch(Plane(origin=(0, 82, 0), x_dir=(1, 0, 0), z_dir=(0, 1, 0))):
        with Locations(Location((-15.75, -30, 0), (0, 0, 270))):
            Circle(SKETCH6_R)
        with Locations(Location((15.75, -30, 0), (0, 0, 90))):
            Circle(SKETCH6_R)
    cut_extrude3 = extrude(amount=-CUT_EXTRUDE3_DEPTH, mode=Mode.SUBTRACT)

    # Mirror1: Cut-Extrude3 across plane
    add(cut_extrude3.mirror(Plane.XY), mode=Mode.SUBTRACT)

    # Sketch7 → Cut-Extrude4 (cut, through all)
    with BuildSketch(Plane(origin=(26.75, 0, 0), x_dir=(0, 0, -1), z_dir=(1, 0, 0))):
        with BuildLine():
            Line((7, 0), (7, 6))
            ThreePointArc((7, 6), (0, 13), (-7, 6))
            Line((-7, 6), (-7, 0))
            Line((-7, 0), (7, 0))
        make_face()
    extrude(amount=-CUT_EXTRUDE4_DEPTH, mode=Mode.SUBTRACT)

    # Sketch8 → Cut-Extrude5 (cut, through all)
    with BuildSketch(Plane(origin=(0, 0, -30), x_dir=(-1, 0, 0), z_dir=(0, 0, -1))):
        with BuildLine():
            Line((7, 0), (7, 6))
            ThreePointArc((7, 6), (0, 13), (-7, 6))
            Line((-7, 6), (-7, 0))
            Line((-7, 0), (7, 0))
        make_face()
    extrude(amount=-CUT_EXTRUDE5_DEPTH, mode=Mode.SUBTRACT)


solid = part.part
